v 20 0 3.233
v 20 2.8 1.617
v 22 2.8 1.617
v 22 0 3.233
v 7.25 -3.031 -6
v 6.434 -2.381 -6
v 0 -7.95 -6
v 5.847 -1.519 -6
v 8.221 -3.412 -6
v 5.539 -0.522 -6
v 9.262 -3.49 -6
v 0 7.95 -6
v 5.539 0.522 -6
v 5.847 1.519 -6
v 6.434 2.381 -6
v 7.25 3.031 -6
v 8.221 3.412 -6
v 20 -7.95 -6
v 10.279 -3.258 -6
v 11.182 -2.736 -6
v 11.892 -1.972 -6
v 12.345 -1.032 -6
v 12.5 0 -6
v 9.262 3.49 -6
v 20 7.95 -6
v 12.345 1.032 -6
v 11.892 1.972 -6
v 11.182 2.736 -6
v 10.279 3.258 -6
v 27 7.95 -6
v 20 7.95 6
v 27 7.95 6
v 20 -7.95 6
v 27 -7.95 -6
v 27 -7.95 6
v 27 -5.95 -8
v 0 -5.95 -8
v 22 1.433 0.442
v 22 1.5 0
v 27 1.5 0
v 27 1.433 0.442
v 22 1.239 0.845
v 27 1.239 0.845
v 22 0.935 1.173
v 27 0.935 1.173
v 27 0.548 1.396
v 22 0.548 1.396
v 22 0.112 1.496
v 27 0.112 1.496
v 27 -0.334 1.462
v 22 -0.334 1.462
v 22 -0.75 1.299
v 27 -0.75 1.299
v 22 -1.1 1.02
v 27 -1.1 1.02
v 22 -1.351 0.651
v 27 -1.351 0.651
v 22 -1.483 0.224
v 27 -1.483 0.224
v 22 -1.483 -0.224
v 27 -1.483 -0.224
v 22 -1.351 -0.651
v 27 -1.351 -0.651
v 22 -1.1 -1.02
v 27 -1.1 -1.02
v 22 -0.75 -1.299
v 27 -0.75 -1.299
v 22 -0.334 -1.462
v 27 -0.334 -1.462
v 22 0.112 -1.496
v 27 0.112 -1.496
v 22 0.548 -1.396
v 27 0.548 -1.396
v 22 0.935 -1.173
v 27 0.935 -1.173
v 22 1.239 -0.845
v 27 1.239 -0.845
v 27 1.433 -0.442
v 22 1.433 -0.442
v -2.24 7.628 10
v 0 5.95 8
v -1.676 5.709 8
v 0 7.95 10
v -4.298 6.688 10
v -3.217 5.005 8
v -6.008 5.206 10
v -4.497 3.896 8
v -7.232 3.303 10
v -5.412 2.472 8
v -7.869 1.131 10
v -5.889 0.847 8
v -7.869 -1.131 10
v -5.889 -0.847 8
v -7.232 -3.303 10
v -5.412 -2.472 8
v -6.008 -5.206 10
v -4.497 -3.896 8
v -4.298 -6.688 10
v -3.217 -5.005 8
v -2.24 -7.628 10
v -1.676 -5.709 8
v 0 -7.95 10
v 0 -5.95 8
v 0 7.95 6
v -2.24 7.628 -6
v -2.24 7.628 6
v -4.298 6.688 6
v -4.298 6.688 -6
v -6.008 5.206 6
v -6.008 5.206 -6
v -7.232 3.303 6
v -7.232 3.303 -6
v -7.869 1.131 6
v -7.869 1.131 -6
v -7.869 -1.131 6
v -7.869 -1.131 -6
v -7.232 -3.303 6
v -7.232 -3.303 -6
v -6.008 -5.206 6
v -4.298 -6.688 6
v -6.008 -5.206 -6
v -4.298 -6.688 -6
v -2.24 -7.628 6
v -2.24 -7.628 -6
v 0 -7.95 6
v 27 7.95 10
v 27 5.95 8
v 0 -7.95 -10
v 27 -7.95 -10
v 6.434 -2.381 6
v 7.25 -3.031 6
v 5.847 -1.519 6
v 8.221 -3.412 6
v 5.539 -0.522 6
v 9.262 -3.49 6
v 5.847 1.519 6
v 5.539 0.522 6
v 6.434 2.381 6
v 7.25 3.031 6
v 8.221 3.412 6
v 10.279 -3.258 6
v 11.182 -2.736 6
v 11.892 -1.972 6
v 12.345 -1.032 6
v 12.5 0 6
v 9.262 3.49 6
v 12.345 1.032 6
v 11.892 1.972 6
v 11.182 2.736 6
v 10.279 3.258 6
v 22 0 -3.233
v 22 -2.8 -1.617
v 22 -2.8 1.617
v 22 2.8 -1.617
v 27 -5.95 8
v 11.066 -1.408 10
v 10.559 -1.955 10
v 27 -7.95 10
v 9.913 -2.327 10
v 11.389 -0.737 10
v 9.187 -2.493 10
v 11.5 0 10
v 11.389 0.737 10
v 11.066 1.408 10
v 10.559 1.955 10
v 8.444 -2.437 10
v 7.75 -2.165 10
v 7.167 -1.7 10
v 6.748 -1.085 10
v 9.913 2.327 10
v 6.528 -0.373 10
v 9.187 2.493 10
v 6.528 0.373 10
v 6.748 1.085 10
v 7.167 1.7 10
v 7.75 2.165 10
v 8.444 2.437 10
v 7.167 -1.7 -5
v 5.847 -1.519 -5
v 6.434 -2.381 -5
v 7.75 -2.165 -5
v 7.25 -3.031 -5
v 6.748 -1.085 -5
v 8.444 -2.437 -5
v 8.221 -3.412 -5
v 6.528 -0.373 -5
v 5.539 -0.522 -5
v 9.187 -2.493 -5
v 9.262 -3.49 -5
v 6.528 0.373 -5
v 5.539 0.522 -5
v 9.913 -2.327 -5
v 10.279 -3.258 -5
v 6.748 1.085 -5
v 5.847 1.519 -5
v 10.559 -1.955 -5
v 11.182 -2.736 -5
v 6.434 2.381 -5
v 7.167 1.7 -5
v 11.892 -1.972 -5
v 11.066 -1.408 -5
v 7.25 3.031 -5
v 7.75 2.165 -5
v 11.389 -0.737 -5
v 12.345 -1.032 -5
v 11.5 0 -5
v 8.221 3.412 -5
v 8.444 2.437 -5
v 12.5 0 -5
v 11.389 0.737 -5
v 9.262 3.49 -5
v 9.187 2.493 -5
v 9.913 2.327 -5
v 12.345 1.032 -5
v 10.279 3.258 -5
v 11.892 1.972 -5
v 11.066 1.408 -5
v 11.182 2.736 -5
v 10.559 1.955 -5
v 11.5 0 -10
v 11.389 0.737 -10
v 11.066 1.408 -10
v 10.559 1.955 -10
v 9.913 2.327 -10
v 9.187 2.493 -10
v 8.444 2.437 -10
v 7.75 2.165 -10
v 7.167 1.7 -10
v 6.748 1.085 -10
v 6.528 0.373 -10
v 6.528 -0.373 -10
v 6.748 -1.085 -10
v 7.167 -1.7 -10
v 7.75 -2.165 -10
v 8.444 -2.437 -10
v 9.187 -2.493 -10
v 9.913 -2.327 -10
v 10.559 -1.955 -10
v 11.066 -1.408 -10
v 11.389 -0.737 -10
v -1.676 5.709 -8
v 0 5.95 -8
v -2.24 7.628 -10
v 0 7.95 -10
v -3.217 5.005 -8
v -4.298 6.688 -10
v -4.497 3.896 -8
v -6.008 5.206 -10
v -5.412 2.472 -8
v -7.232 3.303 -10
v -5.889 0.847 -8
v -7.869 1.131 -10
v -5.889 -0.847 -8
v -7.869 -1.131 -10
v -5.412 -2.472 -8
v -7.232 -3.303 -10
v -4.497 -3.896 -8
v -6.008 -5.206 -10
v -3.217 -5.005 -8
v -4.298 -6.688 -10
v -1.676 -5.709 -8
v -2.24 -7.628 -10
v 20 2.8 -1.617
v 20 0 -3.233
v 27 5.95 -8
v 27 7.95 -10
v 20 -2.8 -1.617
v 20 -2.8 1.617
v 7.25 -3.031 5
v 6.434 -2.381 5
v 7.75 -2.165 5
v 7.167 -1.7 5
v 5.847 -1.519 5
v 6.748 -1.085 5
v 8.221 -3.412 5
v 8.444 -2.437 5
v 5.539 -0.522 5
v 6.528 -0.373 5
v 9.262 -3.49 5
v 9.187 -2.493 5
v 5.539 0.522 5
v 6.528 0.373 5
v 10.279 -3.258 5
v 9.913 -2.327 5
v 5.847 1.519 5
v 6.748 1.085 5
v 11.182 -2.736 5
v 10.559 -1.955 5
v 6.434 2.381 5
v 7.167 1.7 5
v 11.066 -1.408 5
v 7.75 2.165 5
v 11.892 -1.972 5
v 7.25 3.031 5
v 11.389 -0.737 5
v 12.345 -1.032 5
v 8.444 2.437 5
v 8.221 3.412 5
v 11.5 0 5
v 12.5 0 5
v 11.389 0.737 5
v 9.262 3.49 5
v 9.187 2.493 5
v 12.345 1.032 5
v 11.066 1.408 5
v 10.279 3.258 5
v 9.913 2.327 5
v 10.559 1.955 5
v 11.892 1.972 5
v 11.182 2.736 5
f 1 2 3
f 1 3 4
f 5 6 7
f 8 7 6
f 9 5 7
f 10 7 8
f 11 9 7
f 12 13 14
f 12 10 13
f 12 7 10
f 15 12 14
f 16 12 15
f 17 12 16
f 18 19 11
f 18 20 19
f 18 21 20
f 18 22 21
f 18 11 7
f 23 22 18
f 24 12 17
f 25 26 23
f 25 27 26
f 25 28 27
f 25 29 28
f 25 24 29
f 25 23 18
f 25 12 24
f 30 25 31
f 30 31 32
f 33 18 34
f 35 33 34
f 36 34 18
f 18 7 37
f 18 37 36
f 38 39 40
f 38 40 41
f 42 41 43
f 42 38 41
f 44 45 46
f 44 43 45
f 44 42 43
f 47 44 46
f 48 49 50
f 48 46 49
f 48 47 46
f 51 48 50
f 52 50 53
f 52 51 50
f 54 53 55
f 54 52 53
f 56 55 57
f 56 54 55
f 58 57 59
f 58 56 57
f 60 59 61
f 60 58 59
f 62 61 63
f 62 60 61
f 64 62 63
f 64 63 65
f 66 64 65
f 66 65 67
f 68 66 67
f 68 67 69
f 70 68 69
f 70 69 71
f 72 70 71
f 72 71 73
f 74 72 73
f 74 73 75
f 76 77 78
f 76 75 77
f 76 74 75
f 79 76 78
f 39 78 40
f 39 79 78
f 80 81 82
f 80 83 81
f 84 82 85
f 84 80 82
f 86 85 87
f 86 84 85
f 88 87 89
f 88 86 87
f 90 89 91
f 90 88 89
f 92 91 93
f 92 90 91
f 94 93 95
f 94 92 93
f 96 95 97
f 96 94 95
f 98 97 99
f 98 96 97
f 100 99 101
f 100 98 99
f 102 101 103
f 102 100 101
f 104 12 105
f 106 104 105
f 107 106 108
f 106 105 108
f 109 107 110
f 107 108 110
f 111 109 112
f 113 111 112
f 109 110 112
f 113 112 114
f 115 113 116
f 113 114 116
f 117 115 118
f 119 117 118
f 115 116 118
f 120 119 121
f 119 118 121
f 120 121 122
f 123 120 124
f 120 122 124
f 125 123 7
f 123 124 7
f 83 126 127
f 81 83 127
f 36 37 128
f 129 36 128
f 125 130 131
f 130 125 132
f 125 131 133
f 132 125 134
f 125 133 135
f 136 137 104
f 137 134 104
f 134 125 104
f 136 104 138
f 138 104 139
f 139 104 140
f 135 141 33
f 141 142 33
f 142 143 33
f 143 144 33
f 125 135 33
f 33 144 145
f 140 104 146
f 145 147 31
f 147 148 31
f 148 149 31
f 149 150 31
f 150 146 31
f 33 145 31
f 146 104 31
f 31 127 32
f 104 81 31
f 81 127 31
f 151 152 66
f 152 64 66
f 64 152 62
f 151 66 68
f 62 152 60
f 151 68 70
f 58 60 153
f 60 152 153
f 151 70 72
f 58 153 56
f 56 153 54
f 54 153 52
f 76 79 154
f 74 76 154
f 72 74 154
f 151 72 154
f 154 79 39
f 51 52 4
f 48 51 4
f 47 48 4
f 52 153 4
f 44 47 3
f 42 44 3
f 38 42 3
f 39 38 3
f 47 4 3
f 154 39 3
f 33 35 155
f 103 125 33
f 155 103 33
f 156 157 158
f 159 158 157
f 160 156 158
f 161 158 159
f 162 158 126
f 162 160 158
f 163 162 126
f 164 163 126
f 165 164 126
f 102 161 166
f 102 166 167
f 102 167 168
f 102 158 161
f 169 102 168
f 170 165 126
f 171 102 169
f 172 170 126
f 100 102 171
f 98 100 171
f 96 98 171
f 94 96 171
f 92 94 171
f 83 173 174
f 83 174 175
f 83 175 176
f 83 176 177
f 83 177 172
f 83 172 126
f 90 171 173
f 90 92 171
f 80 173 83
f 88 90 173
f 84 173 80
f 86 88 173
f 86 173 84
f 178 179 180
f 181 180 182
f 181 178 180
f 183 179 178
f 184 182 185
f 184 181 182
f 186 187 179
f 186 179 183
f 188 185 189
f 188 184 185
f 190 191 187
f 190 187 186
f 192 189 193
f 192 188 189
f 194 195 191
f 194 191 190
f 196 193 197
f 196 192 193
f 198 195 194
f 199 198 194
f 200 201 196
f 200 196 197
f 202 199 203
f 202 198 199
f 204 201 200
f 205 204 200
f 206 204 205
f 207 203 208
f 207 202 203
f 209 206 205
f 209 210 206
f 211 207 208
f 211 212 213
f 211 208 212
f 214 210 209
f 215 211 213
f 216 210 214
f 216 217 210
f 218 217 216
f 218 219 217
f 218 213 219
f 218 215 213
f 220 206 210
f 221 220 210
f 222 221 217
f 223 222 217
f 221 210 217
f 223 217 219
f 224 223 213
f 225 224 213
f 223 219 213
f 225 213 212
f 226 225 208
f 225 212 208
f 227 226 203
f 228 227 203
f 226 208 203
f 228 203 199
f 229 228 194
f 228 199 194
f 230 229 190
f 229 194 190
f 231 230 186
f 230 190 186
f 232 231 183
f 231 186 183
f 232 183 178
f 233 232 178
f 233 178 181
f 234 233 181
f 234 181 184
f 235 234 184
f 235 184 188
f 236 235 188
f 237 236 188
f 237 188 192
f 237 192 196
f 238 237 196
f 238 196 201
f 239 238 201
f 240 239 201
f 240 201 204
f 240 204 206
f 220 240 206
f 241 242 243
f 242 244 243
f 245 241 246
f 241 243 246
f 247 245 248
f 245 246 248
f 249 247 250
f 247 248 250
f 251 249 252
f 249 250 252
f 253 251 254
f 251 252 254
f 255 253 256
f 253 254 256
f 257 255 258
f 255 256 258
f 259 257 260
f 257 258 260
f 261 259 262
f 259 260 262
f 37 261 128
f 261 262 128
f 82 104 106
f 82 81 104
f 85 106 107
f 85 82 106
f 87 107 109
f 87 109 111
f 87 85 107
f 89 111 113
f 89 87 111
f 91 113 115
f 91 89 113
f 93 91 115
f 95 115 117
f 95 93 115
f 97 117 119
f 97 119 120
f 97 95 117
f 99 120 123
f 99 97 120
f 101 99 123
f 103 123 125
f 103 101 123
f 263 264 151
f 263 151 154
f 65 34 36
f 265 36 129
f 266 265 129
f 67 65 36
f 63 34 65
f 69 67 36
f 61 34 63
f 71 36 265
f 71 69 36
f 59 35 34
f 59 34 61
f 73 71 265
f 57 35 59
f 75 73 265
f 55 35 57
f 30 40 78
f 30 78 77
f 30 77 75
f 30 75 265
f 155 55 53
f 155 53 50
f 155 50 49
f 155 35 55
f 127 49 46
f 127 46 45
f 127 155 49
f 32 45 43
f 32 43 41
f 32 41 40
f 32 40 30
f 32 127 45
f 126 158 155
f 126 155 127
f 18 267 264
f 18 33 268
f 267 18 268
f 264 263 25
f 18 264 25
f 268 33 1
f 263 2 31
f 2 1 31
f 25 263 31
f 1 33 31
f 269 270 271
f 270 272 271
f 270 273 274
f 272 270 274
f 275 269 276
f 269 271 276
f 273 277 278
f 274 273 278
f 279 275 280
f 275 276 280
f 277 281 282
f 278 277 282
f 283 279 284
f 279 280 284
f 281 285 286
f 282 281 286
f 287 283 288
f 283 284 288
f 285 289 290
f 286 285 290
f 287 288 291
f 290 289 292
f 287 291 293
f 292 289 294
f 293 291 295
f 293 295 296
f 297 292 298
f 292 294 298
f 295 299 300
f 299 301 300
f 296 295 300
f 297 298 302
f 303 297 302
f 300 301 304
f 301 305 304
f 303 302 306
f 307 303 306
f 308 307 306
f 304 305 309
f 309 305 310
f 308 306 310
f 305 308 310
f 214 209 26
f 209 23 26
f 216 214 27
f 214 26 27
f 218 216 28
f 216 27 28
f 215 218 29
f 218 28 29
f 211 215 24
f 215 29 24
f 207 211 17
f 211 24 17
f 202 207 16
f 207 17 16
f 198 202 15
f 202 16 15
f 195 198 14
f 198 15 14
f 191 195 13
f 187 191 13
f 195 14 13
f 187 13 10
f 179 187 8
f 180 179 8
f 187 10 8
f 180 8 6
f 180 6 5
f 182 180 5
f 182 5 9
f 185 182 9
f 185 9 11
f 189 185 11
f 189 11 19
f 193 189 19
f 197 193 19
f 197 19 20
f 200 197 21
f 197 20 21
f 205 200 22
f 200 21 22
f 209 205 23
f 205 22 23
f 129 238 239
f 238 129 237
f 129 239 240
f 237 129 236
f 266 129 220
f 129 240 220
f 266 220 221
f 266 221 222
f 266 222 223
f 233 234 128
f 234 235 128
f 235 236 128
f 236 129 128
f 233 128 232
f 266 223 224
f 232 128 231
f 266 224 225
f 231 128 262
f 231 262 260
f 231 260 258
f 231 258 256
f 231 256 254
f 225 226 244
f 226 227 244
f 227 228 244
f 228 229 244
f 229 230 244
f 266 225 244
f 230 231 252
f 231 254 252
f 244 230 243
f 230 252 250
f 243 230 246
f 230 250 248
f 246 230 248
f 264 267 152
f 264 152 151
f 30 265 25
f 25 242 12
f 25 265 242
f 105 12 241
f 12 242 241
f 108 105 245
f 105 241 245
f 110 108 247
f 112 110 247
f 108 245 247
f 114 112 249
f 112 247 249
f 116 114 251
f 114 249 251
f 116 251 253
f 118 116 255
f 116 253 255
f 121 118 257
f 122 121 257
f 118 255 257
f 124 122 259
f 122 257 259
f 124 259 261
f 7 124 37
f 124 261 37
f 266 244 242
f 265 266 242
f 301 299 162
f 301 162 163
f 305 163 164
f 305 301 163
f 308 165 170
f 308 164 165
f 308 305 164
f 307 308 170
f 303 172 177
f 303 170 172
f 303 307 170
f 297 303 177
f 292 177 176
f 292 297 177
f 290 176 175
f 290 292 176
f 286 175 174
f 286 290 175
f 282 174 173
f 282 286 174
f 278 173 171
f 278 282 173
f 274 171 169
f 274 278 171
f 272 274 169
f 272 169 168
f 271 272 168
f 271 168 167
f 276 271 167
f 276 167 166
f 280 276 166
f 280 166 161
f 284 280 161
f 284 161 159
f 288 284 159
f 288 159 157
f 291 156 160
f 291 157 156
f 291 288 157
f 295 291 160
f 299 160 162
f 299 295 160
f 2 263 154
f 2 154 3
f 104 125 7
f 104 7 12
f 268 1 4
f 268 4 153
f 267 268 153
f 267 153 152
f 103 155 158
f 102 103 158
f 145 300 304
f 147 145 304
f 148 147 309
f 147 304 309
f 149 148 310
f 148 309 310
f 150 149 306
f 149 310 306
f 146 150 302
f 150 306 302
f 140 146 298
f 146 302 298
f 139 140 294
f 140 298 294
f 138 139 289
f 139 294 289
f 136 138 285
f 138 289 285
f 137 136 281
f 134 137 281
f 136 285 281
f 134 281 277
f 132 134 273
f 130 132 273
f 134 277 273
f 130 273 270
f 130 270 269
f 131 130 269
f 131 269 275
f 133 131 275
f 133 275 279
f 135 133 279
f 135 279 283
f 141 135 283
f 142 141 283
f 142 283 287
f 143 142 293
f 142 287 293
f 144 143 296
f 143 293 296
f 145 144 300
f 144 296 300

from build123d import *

# Parameters (mm, degrees)
CYLINDER_R           = 7.95
CYLINDER_DEPTH       = 12
PAD_DEPTH            = 27
BOX_W                = 27
BOX_H                = 15.9
BOX_DEPTH            = 12
SKETCH004_W          = 20
SKETCH004_H          = 20
SKETCH004_R          = 3.5
POCKET_DEPTH         = 6
SKETCH005_R          = 3.5
POCKET001_DEPTH      = 5
SKETCH006_R          = 2.5
POCKET002_DEPTH      = 10.001
POCKET002_DEPTH_BACK = 10.001
POCKET003_DEPTH      = 2
SKETCH008_R          = 1.5
POCKET004_DEPTH      = 7.001


with BuildPart() as structuralcilinder:
    # Cylinder → Cylinder (new body)
    with BuildSketch(Plane.XY.offset(-6)):
        Circle(CYLINDER_R)
    extrude(amount=CYLINDER_DEPTH)


with BuildPart() as idlerbody:
    # Sketch → Pad (new body)
    with BuildSketch(Plane.YZ):
        Polygon((0, 2), (-7.95, 2), (-5.95, 0), (-7.95, -2), (0, -2), (7.95, -2), (5.95, 0), (7.95, 2), align=None)
    extrude(amount=PAD_DEPTH)

    # Sketch002 (on DatumPlane) → AdditiveLoft section 0
    with BuildSketch(Plane.XY.offset(2)):
        with BuildLine():
            ThreePointArc((0, 7.95), (-7.95, 0), (0, -7.95))
            Line((0, 7.95), (0, -7.95))
        make_face()
    # Sketch001 → AdditiveLoft section 1
    with BuildSketch(Plane.XY):
        with BuildLine():
            ThreePointArc((0, 5.95), (-5.95, 0), (0, -5.95))
            Line((0, 5.95), (0, -5.95))
        make_face()
    # Sketch003 (on DatumPlane) → AdditiveLoft section 2
    with BuildSketch(Plane.XY.offset(-2)):
        with BuildLine():
            ThreePointArc((0, 7.95), (-7.95, 0), (0, -7.95))
            Line((0, 7.95), (0, -7.95))
        make_face()
    loft(ruled=True)


with BuildPart() as idlerbody_1:
    # Body placement: moved
    add(idlerbody.part.moved(Location((0, 0, -8))))


with BuildPart() as idlerbody_mirror:
    # Part__Mirroring: instance of IdlerBody
    add(idlerbody_1.part.mirror(Plane(origin=(0, 0, 0), x_dir=(0, 1, 0), z_dir=(0, 0, 1))))


with BuildPart() as finalcutsbody_refined:
    # Box → Box (new body)
    with BuildSketch(Plane(origin=(0, -7.95, -6), x_dir=(1, 0, 0), z_dir=(0, 0, 1))):
        with Locations((13.5, 7.95)):
            Rectangle(BOX_W, BOX_H)
    extrude(amount=BOX_DEPTH)

    # Fusion: union StructuralCilinder, IdlerBody_Mirror, IdlerBody
    add(structuralcilinder.part)
    add(idlerbody_mirror.part)
    add(idlerbody_1.part)

    # Sketch004 → Pocket (cut, symmetric)
    with BuildSketch(Plane.XY):
        with Locations((10, 0)):
            Rectangle(SKETCH004_W, SKETCH004_H)
        with Locations((9, 0)):
            Circle(SKETCH004_R, mode=Mode.SUBTRACT)
    extrude(amount=POCKET_DEPTH, both=True, mode=Mode.SUBTRACT)

    # Sketch005 → Pocket001 (cut, symmetric)
    with BuildSketch(Plane.XY):
        with Locations((9, 0)):
            Circle(SKETCH005_R)
    extrude(amount=POCKET001_DEPTH, both=True, mode=Mode.SUBTRACT)

    # Sketch006 → Pocket002 (cut, two sides)
    with BuildSketch(Plane.XY) as pocket002_sk:
        with Locations((9, 0)):
            Circle(SKETCH006_R)
    extrude(amount=-POCKET002_DEPTH, mode=Mode.SUBTRACT)
    extrude(pocket002_sk.sketch, amount=POCKET002_DEPTH_BACK, mode=Mode.SUBTRACT)

    # Sketch007 (on DatumPlane) → Pocket003 (cut)
    with BuildSketch(Plane.YZ.offset(20)):
        Polygon((2.8, -1.616581), (2.8, 1.616581), (0, 3.233162), (-2.8, 1.616581), (-2.8, -1.616581), (0, -3.233162), align=None)
    extrude(amount=POCKET003_DEPTH, mode=Mode.SUBTRACT)

    # Sketch008 (on DatumPlane) → Pocket004 (cut, through all)
    with BuildSketch(Plane.YZ.offset(20)):
        Circle(SKETCH008_R)
    extrude(amount=POCKET004_DEPTH, mode=Mode.SUBTRACT)


solid = finalcutsbody_refined.part
